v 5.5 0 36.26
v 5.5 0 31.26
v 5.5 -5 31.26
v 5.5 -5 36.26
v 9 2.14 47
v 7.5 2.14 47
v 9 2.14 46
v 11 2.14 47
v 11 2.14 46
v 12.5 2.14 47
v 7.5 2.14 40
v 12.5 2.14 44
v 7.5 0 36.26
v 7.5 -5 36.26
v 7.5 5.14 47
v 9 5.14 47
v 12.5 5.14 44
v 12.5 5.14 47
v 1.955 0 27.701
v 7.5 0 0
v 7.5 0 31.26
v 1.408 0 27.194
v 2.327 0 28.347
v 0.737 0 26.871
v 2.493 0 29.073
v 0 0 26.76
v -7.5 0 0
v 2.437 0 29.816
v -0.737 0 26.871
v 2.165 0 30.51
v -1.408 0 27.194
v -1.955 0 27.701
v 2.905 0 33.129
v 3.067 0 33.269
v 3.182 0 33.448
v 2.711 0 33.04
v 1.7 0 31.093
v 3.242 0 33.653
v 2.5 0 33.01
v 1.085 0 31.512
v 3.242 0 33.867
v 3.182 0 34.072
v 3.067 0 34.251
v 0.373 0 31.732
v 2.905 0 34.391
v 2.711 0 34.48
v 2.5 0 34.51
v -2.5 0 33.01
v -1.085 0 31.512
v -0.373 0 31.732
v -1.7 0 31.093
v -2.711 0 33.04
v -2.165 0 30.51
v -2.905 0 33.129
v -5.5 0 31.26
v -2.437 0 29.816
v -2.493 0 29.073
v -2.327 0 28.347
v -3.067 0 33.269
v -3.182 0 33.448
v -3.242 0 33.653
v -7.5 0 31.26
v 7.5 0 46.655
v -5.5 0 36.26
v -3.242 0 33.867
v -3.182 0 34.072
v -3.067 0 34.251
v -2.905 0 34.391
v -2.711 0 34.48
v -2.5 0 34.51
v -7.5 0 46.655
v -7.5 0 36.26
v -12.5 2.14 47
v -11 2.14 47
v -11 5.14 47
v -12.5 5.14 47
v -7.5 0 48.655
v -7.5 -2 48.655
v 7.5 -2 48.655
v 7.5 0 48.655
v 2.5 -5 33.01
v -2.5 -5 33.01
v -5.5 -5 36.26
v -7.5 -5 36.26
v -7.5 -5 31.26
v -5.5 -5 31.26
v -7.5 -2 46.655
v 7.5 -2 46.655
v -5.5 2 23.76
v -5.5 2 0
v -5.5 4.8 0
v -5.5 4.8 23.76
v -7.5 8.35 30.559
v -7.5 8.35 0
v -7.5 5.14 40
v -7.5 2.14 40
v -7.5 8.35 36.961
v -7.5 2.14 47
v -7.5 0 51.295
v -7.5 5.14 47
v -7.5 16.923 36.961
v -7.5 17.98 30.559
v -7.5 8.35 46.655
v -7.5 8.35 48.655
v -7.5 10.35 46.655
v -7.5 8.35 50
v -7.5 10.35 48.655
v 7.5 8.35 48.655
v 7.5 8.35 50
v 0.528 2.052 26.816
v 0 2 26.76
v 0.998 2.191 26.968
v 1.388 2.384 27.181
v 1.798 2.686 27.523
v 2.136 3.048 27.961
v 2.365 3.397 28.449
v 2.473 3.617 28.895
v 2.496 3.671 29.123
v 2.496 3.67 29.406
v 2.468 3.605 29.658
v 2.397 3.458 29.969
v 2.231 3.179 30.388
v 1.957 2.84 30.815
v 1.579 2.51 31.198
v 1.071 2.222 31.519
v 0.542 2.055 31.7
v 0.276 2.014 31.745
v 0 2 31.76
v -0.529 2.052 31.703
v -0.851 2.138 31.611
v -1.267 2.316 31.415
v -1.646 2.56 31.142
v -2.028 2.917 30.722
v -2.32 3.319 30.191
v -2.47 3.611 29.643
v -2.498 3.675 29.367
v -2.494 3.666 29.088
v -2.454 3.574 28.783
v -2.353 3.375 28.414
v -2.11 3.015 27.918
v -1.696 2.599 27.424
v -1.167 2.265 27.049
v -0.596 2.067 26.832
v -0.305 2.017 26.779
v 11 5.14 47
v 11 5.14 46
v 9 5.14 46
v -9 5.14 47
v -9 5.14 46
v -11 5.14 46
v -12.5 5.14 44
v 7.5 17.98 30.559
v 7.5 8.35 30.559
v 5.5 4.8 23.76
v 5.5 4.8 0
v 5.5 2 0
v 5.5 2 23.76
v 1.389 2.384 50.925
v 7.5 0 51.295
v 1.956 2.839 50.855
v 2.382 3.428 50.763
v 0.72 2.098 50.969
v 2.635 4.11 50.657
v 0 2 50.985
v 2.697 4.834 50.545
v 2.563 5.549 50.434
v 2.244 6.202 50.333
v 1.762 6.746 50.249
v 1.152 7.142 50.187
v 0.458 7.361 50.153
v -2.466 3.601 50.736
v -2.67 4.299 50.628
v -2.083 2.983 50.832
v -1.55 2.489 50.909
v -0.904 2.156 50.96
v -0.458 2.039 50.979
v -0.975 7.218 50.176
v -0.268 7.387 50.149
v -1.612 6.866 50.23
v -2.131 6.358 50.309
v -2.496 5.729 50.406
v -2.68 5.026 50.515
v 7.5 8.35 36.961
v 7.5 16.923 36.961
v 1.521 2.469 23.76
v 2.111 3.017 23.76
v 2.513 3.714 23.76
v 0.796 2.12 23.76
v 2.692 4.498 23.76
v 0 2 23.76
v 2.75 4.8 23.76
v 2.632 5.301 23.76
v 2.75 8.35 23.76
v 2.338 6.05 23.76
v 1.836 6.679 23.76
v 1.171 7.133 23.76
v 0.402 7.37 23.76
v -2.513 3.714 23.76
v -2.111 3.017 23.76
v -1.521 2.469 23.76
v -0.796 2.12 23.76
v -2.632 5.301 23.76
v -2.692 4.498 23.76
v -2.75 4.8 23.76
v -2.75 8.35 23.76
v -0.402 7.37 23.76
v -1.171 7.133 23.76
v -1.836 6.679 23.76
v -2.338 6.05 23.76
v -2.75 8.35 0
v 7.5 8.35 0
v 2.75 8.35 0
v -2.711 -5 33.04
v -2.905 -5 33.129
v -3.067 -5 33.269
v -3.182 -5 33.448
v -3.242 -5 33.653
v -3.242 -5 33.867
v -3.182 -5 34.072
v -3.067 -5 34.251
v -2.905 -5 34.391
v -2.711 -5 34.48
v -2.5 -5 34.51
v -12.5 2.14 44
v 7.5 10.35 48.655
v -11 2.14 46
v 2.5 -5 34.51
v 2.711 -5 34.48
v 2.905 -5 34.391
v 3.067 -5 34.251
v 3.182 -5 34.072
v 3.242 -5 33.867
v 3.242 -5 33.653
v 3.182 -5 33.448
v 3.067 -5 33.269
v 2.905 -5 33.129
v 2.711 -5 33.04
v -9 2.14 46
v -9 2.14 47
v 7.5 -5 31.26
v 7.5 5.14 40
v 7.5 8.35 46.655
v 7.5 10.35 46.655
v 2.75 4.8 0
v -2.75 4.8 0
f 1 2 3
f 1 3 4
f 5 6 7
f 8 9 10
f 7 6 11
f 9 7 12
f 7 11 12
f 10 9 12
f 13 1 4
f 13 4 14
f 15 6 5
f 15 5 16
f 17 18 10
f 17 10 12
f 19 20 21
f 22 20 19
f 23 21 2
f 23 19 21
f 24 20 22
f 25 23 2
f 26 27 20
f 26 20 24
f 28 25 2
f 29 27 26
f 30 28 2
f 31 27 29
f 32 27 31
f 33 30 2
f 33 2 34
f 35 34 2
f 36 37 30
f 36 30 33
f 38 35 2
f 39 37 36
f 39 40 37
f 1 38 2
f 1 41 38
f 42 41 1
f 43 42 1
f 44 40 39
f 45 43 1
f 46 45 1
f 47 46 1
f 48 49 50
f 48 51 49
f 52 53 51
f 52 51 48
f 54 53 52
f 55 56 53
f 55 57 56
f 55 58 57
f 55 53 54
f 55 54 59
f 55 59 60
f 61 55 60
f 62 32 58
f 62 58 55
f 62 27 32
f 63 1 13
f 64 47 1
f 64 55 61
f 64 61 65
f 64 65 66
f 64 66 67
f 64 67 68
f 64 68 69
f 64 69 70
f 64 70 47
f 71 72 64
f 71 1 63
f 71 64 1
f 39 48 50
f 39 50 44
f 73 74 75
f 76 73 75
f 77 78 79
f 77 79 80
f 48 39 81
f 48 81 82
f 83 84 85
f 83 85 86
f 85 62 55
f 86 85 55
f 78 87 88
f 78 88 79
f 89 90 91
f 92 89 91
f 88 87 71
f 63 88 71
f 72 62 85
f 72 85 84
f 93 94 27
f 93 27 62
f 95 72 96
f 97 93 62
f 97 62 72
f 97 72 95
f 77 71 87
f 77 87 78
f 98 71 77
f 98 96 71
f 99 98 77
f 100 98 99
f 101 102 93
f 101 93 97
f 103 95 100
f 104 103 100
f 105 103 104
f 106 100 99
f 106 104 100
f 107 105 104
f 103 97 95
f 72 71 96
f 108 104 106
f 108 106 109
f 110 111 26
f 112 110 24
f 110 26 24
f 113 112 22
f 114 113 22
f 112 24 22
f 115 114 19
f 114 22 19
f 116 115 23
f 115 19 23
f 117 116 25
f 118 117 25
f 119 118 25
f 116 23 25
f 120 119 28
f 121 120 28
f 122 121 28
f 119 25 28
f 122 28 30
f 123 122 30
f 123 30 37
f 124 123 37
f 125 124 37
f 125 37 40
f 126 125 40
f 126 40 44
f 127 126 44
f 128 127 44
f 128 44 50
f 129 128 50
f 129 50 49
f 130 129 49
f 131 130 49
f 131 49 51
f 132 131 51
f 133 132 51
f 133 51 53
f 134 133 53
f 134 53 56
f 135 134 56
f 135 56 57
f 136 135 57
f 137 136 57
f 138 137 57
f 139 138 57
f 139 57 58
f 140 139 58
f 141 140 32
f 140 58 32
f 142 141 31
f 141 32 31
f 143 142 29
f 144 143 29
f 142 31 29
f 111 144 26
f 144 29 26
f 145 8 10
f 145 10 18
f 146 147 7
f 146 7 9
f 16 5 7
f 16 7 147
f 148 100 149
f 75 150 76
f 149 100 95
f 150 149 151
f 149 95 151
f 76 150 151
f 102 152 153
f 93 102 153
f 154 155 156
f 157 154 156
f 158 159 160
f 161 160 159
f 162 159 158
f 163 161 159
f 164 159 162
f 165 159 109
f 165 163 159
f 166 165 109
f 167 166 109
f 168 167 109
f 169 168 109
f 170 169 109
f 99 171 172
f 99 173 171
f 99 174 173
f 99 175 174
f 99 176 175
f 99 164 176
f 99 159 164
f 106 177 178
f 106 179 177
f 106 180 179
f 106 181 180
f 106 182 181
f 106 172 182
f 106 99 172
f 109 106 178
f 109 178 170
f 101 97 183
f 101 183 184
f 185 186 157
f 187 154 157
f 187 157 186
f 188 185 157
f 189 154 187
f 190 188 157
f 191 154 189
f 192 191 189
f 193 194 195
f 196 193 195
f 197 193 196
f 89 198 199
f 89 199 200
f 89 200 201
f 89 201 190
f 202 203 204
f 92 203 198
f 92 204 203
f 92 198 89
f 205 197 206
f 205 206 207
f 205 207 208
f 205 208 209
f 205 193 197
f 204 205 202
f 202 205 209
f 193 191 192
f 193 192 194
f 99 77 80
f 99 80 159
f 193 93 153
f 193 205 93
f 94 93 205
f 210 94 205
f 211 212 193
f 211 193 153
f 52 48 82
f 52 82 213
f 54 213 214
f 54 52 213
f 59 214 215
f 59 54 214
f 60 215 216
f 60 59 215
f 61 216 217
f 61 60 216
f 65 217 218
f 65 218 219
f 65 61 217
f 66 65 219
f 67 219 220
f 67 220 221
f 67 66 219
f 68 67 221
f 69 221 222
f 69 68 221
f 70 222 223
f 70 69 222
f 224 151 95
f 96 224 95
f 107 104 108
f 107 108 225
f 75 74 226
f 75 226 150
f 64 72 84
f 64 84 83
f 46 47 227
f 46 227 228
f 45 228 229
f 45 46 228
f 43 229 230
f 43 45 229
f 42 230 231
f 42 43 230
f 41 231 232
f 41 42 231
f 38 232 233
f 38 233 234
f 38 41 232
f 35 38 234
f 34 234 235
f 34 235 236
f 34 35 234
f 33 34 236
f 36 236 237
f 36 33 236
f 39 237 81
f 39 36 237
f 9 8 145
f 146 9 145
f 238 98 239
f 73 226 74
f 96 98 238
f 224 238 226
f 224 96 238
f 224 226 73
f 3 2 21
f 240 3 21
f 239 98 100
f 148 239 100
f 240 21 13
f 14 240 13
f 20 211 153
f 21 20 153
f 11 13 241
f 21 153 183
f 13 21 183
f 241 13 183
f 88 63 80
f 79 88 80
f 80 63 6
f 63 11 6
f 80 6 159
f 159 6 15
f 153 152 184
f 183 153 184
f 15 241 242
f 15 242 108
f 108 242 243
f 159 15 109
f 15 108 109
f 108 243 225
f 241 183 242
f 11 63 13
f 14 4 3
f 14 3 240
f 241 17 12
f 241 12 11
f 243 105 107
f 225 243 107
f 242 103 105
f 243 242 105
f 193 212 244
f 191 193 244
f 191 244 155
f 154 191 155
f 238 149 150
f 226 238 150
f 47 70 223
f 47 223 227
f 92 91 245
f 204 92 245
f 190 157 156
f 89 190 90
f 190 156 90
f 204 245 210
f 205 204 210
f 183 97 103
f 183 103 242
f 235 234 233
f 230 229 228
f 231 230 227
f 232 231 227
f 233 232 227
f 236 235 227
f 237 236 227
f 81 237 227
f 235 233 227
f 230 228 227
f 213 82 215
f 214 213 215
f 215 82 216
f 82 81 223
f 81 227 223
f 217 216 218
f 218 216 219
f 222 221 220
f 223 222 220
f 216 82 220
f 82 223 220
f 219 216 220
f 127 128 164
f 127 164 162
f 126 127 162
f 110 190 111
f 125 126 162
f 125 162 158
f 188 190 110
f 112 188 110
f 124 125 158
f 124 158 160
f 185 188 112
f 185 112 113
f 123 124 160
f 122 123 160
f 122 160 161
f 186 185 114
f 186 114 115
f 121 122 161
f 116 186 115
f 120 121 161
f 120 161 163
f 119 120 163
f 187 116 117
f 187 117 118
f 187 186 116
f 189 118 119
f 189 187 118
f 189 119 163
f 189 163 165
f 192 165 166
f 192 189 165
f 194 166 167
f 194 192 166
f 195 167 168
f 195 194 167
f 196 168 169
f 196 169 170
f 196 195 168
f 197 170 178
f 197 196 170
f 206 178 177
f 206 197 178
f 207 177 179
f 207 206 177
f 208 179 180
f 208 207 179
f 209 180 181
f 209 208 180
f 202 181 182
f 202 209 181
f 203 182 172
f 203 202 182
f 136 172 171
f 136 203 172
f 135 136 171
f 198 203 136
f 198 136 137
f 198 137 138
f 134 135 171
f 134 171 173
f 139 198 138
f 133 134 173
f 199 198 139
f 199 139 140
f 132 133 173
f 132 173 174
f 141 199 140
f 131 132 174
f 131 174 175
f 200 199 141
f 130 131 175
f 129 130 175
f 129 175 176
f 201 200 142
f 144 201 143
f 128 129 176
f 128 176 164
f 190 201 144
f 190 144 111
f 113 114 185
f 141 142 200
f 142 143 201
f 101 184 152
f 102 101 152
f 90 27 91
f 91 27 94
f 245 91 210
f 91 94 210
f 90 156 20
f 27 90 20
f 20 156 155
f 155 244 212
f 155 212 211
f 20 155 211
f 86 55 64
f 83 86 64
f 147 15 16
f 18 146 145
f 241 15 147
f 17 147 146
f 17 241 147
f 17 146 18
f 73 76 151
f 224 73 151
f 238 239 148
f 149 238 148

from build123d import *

# Parameters (mm, degrees)
SKETCH9_W               = 15
SKETCH9_H               = 8.35
BOSS_EXTRUDE4_DEPTH     = 50
CUT_EXTRUDE4_DEPTH      = 23.76
BOSS_EXTRUDE9_DEPTH     = 15
CUT_EXTRUDE5_REACH      = 31.734
SKETCH10_R              = 2.7
SKETCH12_W              = 3
SKETCH12_H              = 3
BOSS_EXTRUDE5_DEPTH     = 5
SKETCH13_W              = 2
SKETCH13_H              = 3
CUT_EXTRUDE6_DEPTH      = 1
BOSS_EXTRUDE6_DEPTH     = 3
SKETCH22_W              = 2
SKETCH22_H              = 2
BOSS_EXTRUDE10_DEPTH    = 15
CUT_EXTRUDE7_REACH      = 55.801
CUT_EXTRUDE7_END_RADIUS = 2.7
SKETCH23_R              = 2.5
SKETCH24_W              = 2
SKETCH24_H              = 5
BOSS_EXTRUDE11_DEPTH    = 5
BOSS_EXTRUDE12_DEPTH    = 15


with BuildPart() as part:
    # Sketch9 → Boss-Extrude4 (new body)
    with BuildSketch(Plane.XY):
        with Locations((0, 4.175)):
            Rectangle(SKETCH9_W, SKETCH9_H)
    extrude(amount=BOSS_EXTRUDE4_DEPTH)

    # Sketch7 → Cut-Extrude4 (cut)
    with BuildSketch(Plane.XY):
        Polygon((-5.5, 2), (-5.5, 4.8), (-2.75, 4.8), (-2.75, 8.35), (2.75, 8.35), (2.75, 4.8), (5.5, 4.8), (5.5, 2), align=None)
    extrude(amount=CUT_EXTRUDE4_DEPTH, mode=Mode.SUBTRACT)

    # Sketch21 → Boss-Extrude9 (add)
    with BuildSketch(Plane.ZY.offset(7.5)):
        Polygon((50, 0), (51.294730508, 0), (50, 8.35), align=None)
    extrude(amount=-BOSS_EXTRUDE9_DEPTH)

    # Cut-Extrude5: up to this plane
    cut_extrude5_end = Plane(origin=(15.949782665, 0, 51.294730508), z_dir=(0, 0.15322648630316937, 0.9881910968507989))
    # Sketch10 → Cut-Extrude5 (cut, up to the surface)
    with BuildSketch(Plane.XY.offset(23.76), mode=Mode.PRIVATE) as cut_extrude5_sk1:
        with Locations(Location((0, 4.7, 0), (0, 0, 270))):
            Circle(SKETCH10_R)
    cut_extrude5_tool1 = split(extrude(cut_extrude5_sk1.sketch, amount=CUT_EXTRUDE5_REACH, mode=Mode.PRIVATE), bisect_by=cut_extrude5_end, keep=Keep.BOTH, mode=Mode.PRIVATE)
    add(cut_extrude5_tool1.solids().sort_by_distance((0, 4.7, 23.76))[0], mode=Mode.SUBTRACT)

    # Sketch12 → Boss-Extrude5 (add)
    with BuildSketch(Plane(origin=(7.5, 0, 0), x_dir=(0, 0, -1), z_dir=(1, 0, 0))):
        with Locations((-45.5, 3.64)):
            Rectangle(SKETCH12_W, SKETCH12_H)
    boss_extrude5 = extrude(amount=BOSS_EXTRUDE5_DEPTH)

    # Sketch13 → Cut-Extrude6 (cut)
    with BuildSketch(Plane.XY.offset(47)):
        with Locations((10, 3.64)):
            Rectangle(SKETCH13_W, SKETCH13_H)
    cut_extrude6 = extrude(amount=-CUT_EXTRUDE6_DEPTH, mode=Mode.SUBTRACT)

    # Mirror2: Boss-Extrude5 across plane
    add(boss_extrude5.mirror(Plane(origin=(0, 0, 0), x_dir=(0, 0, 1), z_dir=(1, 0, 0))))

    # Mirror4: Cut-Extrude6 across plane
    add(cut_extrude6.mirror(Plane(origin=(0, 0, 0), x_dir=(0, 0, 1), z_dir=(1, 0, 0))), mode=Mode.SUBTRACT)

    # Sketch14 → Boss-Extrude6 (add)
    with BuildSketch(Plane(origin=(0, 5.14, 0), x_dir=(1, 0, 0), z_dir=(0, 1, 0))):
        Polygon((12.5, -44), (7.5, -40), (7.5, -44), align=None)
    boss_extrude6 = extrude(amount=-BOSS_EXTRUDE6_DEPTH)

    # Mirror5: Boss-Extrude6 across plane
    add(boss_extrude6.mirror(Plane(origin=(0, 0, 0), x_dir=(0, 0, 1), z_dir=(1, 0, 0))))

    # Sketch22 → Boss-Extrude10 (add)
    with BuildSketch(Plane.ZY.offset(7.5)):
        with Locations((47.655054804, -1)):
            Rectangle(SKETCH22_W, SKETCH22_H)
        with Locations((47.655054804, 9.35)):
            Rectangle(SKETCH22_W, SKETCH22_H)
    extrude(amount=-BOSS_EXTRUDE10_DEPTH)

    # Cut-Extrude7: up to this cylinder (the profile starts outside it)
    cut_extrude7_end = Plane(origin=(0, 4.7, 29.26), z_dir=(0, 0, -1)) * Cylinder(CUT_EXTRUDE7_END_RADIUS, 118.002, mode=Mode.PRIVATE)
    # Sketch23 → Cut-Extrude7 (cut, up to the surface)
    with BuildSketch(Plane.XZ, mode=Mode.PRIVATE) as cut_extrude7_sk1:
        with Locations(Location((0, 29.26, 0), (0, 0, 270))):
            Circle(SKETCH23_R)
    cut_extrude7_tool1 = extrude(cut_extrude7_sk1.sketch, amount=-CUT_EXTRUDE7_REACH, mode=Mode.PRIVATE) - cut_extrude7_end
    add(cut_extrude7_tool1.solids().sort_by_distance((0, 0, 29.26))[0], mode=Mode.SUBTRACT)

    # Sketch24 → Boss-Extrude11 (add)
    with BuildSketch(Plane.XZ):
        with Locations((6.5, 33.76)):
            Rectangle(SKETCH24_W, SKETCH24_H)
        with Locations((-6.5, 33.76)):
            Rectangle(SKETCH24_W, SKETCH24_H)
        with BuildLine():
            Line((2.5, 33.01), (-2.5, 33.01))
            ThreePointArc((-2.5, 33.01), (-3.25, 33.76), (-2.5, 34.51))
            Line((-2.5, 34.51), (2.5, 34.51))
            ThreePointArc((2.5, 34.51), (3.25, 33.76), (2.5, 33.01))
        make_face()
    extrude(amount=BOSS_EXTRUDE11_DEPTH)

    # Sketch25 → Boss-Extrude12 (add)
    with BuildSketch(Plane(origin=(7.5, 0, 0), x_dir=(0, 0, -1), z_dir=(1, 0, 0))):
        Polygon((-30.558938802, 8.35), (-36.961061198, 8.35), (-36.961061198, 16.922552294), (-30.558938802, 17.980397342), align=None)
    extrude(amount=-BOSS_EXTRUDE12_DEPTH)


solid = part.part
